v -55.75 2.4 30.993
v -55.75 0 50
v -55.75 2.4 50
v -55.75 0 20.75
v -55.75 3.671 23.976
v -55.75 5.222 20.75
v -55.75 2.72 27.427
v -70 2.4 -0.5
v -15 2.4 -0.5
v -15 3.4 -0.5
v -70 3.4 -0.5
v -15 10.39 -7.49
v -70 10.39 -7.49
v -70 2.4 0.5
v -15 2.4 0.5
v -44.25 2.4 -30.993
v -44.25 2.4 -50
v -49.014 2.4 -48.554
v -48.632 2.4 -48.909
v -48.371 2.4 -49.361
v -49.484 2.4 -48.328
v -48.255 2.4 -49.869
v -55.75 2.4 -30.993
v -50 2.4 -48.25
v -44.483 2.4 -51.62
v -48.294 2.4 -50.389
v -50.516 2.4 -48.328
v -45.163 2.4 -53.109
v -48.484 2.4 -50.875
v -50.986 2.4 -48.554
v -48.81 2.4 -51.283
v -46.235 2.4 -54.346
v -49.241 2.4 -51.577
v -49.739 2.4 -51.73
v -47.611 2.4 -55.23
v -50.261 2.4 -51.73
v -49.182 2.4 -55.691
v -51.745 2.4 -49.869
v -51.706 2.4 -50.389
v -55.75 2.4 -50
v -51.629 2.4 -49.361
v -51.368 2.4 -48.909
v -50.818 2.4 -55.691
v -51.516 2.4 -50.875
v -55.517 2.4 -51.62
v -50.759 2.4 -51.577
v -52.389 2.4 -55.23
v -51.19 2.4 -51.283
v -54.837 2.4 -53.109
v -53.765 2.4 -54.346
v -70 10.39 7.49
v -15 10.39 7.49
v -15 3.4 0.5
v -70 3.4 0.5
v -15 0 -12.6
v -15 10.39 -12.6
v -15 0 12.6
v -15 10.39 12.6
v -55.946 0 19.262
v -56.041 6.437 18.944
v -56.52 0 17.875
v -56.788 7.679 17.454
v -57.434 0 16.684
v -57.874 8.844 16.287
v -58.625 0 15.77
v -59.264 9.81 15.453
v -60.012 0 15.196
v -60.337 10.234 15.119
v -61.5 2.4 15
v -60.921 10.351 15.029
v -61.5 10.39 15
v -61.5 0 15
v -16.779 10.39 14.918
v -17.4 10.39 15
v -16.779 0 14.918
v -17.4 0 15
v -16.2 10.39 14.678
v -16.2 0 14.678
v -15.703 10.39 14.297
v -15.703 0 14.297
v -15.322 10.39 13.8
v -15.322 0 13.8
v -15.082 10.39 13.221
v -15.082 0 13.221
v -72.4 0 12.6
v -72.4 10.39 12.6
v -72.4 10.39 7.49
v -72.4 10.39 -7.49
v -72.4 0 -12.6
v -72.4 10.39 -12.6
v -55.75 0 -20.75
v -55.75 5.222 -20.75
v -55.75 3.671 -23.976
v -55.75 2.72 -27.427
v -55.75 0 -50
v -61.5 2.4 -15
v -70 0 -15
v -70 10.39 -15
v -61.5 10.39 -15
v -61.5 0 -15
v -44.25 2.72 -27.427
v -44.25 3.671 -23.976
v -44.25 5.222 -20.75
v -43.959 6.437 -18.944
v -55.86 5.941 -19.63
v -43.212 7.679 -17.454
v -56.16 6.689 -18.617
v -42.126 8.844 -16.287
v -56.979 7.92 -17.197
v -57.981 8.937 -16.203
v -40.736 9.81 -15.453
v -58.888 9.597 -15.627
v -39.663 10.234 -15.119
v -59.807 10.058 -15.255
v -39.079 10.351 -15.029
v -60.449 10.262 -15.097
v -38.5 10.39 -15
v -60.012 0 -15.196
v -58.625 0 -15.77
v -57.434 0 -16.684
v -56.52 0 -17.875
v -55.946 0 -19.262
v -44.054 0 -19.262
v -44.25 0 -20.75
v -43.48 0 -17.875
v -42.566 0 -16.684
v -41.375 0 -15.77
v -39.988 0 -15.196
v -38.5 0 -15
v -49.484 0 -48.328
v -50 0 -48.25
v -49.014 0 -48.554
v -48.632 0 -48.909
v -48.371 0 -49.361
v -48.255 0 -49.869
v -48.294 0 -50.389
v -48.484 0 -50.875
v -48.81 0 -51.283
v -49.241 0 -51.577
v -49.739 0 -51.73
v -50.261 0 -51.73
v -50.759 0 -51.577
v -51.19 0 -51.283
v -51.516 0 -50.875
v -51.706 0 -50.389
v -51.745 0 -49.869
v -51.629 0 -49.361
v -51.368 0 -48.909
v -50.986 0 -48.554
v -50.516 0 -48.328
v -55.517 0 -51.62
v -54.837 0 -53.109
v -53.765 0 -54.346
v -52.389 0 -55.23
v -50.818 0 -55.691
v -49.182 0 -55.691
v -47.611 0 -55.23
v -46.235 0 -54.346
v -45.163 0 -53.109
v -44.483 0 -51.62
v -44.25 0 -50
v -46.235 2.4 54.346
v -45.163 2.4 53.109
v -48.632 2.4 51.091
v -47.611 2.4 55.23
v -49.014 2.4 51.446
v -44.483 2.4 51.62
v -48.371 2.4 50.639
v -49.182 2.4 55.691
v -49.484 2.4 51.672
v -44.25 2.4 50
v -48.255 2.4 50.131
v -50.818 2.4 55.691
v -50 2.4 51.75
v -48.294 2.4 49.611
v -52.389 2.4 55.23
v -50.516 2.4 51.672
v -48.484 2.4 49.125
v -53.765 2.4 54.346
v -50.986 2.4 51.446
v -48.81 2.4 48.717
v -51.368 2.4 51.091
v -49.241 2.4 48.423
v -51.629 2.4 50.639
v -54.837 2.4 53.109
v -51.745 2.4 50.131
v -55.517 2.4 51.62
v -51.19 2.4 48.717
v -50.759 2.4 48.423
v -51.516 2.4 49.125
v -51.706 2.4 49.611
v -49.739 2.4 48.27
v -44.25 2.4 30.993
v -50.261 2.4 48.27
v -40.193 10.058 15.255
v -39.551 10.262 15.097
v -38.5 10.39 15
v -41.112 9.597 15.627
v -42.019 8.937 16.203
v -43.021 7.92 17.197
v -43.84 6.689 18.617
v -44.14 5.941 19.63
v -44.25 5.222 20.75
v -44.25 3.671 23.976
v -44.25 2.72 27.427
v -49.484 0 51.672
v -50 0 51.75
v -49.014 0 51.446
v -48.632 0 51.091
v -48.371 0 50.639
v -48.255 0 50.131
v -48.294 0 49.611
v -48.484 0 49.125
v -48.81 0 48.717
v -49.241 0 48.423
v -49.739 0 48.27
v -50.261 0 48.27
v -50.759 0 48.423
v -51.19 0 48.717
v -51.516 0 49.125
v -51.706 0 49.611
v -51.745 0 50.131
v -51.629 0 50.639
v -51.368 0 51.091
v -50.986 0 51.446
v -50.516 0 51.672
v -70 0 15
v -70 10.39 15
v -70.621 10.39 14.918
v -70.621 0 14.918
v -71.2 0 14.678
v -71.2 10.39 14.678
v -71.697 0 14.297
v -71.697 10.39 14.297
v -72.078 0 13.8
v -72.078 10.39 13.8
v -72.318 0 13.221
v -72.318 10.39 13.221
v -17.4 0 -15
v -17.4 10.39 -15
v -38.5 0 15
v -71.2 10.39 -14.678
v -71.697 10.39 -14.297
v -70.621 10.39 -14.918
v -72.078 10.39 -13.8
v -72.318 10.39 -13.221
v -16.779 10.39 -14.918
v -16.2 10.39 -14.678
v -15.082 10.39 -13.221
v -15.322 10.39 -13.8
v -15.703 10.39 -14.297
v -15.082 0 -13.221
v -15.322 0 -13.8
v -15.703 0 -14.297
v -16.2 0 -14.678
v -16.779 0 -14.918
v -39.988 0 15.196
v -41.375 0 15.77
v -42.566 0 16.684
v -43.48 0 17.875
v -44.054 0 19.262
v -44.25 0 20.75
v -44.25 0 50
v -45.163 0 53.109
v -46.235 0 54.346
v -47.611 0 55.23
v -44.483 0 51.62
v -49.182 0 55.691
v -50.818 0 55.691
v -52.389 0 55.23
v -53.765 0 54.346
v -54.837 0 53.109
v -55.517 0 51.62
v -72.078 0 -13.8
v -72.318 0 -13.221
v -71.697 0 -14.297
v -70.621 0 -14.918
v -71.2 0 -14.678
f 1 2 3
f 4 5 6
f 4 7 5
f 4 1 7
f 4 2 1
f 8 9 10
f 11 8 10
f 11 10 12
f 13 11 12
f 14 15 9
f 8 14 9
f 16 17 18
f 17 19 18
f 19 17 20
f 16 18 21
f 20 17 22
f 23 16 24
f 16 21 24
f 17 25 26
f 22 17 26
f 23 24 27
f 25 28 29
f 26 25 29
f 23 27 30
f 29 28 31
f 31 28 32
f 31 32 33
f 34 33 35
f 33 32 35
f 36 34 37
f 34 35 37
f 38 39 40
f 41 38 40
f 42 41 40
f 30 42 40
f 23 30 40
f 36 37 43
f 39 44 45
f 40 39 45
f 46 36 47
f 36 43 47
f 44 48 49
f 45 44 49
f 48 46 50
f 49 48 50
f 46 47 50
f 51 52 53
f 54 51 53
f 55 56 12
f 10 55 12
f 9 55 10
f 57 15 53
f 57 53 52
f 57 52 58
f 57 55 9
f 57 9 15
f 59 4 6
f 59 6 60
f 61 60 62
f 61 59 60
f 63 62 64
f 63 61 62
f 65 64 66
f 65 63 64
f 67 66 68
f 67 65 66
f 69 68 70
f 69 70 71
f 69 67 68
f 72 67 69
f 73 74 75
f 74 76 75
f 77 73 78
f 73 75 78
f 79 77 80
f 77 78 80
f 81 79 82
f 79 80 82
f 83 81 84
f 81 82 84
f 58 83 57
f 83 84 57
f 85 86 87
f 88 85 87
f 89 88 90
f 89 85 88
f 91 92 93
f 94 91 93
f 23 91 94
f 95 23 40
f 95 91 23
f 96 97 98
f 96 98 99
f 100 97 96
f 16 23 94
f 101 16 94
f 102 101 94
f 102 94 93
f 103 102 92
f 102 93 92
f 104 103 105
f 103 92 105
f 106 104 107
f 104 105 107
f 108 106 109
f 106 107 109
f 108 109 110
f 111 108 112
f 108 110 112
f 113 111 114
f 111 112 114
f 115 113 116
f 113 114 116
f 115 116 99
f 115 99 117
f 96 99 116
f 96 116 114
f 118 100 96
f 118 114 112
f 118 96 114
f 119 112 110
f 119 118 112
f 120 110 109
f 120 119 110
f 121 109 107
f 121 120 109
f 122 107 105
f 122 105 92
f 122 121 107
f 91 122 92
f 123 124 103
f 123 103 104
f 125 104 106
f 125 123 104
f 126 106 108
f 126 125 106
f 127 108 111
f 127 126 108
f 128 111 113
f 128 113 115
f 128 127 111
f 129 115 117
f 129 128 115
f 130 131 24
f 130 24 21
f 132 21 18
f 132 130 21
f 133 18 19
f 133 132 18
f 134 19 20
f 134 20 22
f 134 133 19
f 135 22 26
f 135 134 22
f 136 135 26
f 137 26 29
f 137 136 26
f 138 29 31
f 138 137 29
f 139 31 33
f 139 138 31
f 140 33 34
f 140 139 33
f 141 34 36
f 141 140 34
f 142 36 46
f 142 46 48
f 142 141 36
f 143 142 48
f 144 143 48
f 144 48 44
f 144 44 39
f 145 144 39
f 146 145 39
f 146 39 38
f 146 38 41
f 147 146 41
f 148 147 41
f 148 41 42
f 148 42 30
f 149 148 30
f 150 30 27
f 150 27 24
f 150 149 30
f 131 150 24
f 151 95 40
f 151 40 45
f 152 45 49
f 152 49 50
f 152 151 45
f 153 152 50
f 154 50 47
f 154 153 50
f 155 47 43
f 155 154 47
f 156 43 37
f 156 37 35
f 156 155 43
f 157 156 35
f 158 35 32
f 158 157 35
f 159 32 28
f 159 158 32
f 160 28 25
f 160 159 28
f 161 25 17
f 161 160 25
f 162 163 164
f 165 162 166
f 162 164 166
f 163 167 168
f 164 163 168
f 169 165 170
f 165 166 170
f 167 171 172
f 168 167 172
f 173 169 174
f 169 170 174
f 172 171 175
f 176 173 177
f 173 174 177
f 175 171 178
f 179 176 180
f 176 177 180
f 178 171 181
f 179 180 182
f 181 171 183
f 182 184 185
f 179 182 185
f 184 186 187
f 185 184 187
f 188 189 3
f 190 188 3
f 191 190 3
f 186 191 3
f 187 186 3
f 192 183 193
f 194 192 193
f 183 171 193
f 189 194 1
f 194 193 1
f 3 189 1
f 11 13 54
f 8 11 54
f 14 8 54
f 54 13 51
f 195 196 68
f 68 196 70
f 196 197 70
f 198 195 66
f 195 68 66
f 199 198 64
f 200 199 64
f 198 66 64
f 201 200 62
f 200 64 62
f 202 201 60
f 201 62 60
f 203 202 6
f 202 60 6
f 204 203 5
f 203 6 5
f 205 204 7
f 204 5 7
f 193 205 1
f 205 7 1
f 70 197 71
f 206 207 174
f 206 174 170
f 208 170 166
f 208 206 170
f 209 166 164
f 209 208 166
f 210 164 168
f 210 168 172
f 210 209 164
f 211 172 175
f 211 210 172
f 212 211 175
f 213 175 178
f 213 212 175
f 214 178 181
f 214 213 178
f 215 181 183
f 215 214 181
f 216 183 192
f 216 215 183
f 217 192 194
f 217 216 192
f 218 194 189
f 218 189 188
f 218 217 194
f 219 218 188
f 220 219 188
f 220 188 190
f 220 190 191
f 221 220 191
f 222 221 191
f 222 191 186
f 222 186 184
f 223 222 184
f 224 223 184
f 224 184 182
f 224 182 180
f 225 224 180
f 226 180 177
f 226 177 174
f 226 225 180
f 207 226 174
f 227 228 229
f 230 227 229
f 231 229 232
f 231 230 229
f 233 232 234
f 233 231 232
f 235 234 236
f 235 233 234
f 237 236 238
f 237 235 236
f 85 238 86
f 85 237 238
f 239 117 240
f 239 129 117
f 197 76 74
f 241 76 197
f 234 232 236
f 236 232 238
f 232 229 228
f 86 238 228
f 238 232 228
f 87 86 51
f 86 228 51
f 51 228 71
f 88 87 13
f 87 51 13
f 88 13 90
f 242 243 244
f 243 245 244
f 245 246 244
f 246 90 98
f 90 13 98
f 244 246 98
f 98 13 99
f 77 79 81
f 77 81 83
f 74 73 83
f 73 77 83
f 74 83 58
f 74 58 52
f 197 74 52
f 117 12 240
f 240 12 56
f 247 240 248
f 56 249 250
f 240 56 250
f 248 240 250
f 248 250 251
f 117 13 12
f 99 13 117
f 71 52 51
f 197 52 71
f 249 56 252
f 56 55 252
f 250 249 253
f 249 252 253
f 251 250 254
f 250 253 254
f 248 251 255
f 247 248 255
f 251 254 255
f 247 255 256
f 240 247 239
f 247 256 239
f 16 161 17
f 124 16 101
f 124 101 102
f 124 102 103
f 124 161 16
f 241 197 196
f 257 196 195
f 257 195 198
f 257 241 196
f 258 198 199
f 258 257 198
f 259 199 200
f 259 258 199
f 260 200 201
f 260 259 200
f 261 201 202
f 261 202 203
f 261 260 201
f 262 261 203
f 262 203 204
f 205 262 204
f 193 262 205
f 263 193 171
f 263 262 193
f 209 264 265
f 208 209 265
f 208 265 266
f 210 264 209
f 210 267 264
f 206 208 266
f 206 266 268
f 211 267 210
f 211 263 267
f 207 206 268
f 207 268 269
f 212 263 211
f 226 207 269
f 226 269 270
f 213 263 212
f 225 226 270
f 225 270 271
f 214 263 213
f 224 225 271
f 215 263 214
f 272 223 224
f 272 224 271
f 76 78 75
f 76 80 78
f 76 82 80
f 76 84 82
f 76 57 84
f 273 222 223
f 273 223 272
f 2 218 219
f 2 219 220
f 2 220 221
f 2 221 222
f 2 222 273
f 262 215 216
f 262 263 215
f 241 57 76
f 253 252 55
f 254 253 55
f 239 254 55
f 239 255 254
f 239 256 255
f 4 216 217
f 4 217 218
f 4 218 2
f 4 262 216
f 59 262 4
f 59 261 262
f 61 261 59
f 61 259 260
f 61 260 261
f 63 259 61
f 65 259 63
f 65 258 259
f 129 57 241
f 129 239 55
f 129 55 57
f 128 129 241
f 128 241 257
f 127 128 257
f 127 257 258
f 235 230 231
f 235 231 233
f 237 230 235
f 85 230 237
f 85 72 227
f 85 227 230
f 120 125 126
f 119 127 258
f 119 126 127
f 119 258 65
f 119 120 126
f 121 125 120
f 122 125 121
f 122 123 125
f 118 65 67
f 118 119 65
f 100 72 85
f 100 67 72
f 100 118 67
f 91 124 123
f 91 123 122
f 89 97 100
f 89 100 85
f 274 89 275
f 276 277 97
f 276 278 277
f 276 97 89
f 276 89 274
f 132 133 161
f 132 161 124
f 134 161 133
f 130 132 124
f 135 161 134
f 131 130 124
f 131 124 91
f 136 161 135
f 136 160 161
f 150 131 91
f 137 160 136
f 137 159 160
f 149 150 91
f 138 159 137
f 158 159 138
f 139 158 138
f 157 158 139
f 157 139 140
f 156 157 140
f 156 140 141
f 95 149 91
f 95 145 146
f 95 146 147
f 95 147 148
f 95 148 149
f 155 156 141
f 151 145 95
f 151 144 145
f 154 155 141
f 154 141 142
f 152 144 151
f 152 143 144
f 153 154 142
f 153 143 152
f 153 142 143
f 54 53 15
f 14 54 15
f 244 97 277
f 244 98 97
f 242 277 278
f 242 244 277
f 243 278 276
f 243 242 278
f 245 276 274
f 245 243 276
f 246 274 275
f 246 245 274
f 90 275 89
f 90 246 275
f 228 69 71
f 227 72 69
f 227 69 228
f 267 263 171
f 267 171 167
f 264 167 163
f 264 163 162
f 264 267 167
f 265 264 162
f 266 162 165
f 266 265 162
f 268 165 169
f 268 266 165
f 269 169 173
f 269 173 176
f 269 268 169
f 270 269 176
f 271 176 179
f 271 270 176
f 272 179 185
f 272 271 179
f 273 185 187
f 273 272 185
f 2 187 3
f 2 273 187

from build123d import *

# Parameters (mm, degrees)
SKETCH1_R           = 1.75
BOSS_EXTRUDE1_DEPTH = 2.4
BOSS_EXTRUDE2_DEPTH = 57.4
SKETCH3_W           = 30
SKETCH3_H           = 10.390128061
BOSS_EXTRUDE3_DEPTH = 2.4
FILLET1_START       = -61.5000001
FILLET1_DEPTH       = 23.0000001
FILLET1_START_2     = 2.4
FILLET1_2_DEPTH     = 7.99015084
FILLET2_R           = 2.4


with BuildPart() as part:
    # Sketch1 → Boss-Extrude1 (new body)
    with BuildSketch(Plane(origin=(0, 0, 0), x_dir=(1, 0, 0), z_dir=(0, 1, 0))):
        with BuildLine():
            Line((-44.25, 50), (-44.25, 20.75))
            ThreePointArc((-44.25, 20.75), (-42.565863992, 16.684136008), (-38.5, 15))
            Line((-38.5, 15), (-15, 15))
            Line((-15, 15), (-15, -15))
            Line((-15, -15), (-38.5, -15))
            ThreePointArc((-38.5, -15), (-42.565863992, -16.684136008), (-44.25, -20.75))
            Line((-44.25, -20.75), (-44.25, -50))
            ThreePointArc((-44.25, -50), (-50, -55.75), (-55.75, -50))
            Line((-55.75, -50), (-55.75, -20.75))
            ThreePointArc((-55.75, -20.75), (-57.434136008, -16.684136008), (-61.5, -15))
            Line((-61.5, -15), (-72.4, -15))
            Line((-72.4, -15), (-72.4, 15))
            Line((-72.4, 15), (-61.5, 15))
            ThreePointArc((-61.5, 15), (-57.434136008, 16.684136008), (-55.75, 20.75))
            Line((-55.75, 20.75), (-55.75, 50))
            ThreePointArc((-55.75, 50), (-50, 55.75), (-44.25, 50))
        make_face()
        with Locations(Location((-50, 50, 0), (0, 0, 270))):
            Circle(SKETCH1_R, mode=Mode.SUBTRACT)
        with Locations(Location((-50, -50, 0), (0, 0, 270))):
            Circle(SKETCH1_R, mode=Mode.SUBTRACT)
    extrude(amount=BOSS_EXTRUDE1_DEPTH)

    # Sketch2 → Boss-Extrude2 (add)
    with BuildSketch(Plane(origin=(-15, 0, 0), x_dir=(0, 0, -1), z_dir=(1, 0, 0))):
        Polygon((-15, 0), (-15, 10.390128061), (-7.490128061, 10.390128061), (-0.5, 3.4), (-0.5, 2.4), (0.5, 2.4), (0.5, 3.4), (7.490128061, 10.390128061), (15, 10.390128061), (15, 0), align=None)
    extrude(amount=-BOSS_EXTRUDE2_DEPTH)

    # Sketch3 → Boss-Extrude3 (add)
    with BuildSketch(Plane.ZY.offset(72.4)):
        with Locations((0, 5.195064031)):
            Rectangle(SKETCH3_W, SKETCH3_H)
    extrude(amount=-BOSS_EXTRUDE3_DEPTH)

    # Fillet1: read off the stored shape, not the designer's step
    # Fillet1 outline → Fillet1 (add)
    with BuildSketch(Plane.YZ.offset(FILLET1_START)):
        with BuildLine():
            Line((2.4, -15), (2.4, -30.992591285))
            ThreePointArc((2.4, -30.992591285), (4.508703468, -22.053826918), (10.39015084, -14.999982893))
            Line((10.39015084, -14.999982893), (2.4, -15))
        make_face()
        with BuildLine():
            ThreePointArc((10.39015084, 14.999982893), (4.508703468, 22.053826918), (2.4, 30.992591285))
            Line((2.4, 30.992591285), (2.4, 15))
            Line((2.4, 15), (10.39015084, 14.999982893))
        make_face()
    extrude(amount=FILLET1_DEPTH)

    # Fillet1 2 outline → Fillet1 2 (cut)
    with BuildSketch(Plane(origin=(0, 0, 0), x_dir=(1, 0, 0), z_dir=(0, 1, 0)).offset(FILLET1_START_2)):
        with BuildLine():
            ThreePointArc((-38.5, -15), (-42.565863992, -16.684136008), (-44.25, -20.75))
            Line((-44.25, -20.75), (-44.25, -32))
            Line((-44.25, -32), (-38.5, -32))
            Line((-38.5, -32), (-38.5, -15))
        make_face()
        with BuildLine():
            Line((-61.5000001, -32), (-55.75, -32))
            Line((-55.75, -32), (-55.75, -20.75))
            ThreePointArc((-55.75, -20.75), (-57.434136008, -16.684136008), (-61.5, -15))
            Line((-61.5, -15), (-61.5000001, -32))
        make_face()
        with BuildLine():
            Line((-38.5, 15), (-38.5, 32))
            Line((-38.5, 32), (-44.25, 32))
            Line((-44.25, 32), (-44.25, 20.75))
            ThreePointArc((-44.25, 20.75), (-42.565863992, 16.684136008), (-38.5, 15))
        make_face()
        with BuildLine():
            Line((-55.75, 32), (-61.5000001, 32))
            Line((-61.5000001, 32), (-61.5, 15))
            ThreePointArc((-61.5, 15), (-57.434136008, 16.684136008), (-55.75, 20.75))
            Line((-55.75, 20.75), (-55.75, 32))
        make_face()
    extrude(amount=FILLET1_2_DEPTH, mode=Mode.SUBTRACT)

    # Fillet2
    fillet2_edges = [part.edges().sort_by_distance(p)[0] for p in [
        (-72.4, 5.19506403, 15),
        (-72.4, 5.19506403, -15),
        (-15, 5.19506403, -15),
        (-15, 5.19506403, 15),
    ]]
    fillet(fillet2_edges, radius=FILLET2_R)


solid = part.part
